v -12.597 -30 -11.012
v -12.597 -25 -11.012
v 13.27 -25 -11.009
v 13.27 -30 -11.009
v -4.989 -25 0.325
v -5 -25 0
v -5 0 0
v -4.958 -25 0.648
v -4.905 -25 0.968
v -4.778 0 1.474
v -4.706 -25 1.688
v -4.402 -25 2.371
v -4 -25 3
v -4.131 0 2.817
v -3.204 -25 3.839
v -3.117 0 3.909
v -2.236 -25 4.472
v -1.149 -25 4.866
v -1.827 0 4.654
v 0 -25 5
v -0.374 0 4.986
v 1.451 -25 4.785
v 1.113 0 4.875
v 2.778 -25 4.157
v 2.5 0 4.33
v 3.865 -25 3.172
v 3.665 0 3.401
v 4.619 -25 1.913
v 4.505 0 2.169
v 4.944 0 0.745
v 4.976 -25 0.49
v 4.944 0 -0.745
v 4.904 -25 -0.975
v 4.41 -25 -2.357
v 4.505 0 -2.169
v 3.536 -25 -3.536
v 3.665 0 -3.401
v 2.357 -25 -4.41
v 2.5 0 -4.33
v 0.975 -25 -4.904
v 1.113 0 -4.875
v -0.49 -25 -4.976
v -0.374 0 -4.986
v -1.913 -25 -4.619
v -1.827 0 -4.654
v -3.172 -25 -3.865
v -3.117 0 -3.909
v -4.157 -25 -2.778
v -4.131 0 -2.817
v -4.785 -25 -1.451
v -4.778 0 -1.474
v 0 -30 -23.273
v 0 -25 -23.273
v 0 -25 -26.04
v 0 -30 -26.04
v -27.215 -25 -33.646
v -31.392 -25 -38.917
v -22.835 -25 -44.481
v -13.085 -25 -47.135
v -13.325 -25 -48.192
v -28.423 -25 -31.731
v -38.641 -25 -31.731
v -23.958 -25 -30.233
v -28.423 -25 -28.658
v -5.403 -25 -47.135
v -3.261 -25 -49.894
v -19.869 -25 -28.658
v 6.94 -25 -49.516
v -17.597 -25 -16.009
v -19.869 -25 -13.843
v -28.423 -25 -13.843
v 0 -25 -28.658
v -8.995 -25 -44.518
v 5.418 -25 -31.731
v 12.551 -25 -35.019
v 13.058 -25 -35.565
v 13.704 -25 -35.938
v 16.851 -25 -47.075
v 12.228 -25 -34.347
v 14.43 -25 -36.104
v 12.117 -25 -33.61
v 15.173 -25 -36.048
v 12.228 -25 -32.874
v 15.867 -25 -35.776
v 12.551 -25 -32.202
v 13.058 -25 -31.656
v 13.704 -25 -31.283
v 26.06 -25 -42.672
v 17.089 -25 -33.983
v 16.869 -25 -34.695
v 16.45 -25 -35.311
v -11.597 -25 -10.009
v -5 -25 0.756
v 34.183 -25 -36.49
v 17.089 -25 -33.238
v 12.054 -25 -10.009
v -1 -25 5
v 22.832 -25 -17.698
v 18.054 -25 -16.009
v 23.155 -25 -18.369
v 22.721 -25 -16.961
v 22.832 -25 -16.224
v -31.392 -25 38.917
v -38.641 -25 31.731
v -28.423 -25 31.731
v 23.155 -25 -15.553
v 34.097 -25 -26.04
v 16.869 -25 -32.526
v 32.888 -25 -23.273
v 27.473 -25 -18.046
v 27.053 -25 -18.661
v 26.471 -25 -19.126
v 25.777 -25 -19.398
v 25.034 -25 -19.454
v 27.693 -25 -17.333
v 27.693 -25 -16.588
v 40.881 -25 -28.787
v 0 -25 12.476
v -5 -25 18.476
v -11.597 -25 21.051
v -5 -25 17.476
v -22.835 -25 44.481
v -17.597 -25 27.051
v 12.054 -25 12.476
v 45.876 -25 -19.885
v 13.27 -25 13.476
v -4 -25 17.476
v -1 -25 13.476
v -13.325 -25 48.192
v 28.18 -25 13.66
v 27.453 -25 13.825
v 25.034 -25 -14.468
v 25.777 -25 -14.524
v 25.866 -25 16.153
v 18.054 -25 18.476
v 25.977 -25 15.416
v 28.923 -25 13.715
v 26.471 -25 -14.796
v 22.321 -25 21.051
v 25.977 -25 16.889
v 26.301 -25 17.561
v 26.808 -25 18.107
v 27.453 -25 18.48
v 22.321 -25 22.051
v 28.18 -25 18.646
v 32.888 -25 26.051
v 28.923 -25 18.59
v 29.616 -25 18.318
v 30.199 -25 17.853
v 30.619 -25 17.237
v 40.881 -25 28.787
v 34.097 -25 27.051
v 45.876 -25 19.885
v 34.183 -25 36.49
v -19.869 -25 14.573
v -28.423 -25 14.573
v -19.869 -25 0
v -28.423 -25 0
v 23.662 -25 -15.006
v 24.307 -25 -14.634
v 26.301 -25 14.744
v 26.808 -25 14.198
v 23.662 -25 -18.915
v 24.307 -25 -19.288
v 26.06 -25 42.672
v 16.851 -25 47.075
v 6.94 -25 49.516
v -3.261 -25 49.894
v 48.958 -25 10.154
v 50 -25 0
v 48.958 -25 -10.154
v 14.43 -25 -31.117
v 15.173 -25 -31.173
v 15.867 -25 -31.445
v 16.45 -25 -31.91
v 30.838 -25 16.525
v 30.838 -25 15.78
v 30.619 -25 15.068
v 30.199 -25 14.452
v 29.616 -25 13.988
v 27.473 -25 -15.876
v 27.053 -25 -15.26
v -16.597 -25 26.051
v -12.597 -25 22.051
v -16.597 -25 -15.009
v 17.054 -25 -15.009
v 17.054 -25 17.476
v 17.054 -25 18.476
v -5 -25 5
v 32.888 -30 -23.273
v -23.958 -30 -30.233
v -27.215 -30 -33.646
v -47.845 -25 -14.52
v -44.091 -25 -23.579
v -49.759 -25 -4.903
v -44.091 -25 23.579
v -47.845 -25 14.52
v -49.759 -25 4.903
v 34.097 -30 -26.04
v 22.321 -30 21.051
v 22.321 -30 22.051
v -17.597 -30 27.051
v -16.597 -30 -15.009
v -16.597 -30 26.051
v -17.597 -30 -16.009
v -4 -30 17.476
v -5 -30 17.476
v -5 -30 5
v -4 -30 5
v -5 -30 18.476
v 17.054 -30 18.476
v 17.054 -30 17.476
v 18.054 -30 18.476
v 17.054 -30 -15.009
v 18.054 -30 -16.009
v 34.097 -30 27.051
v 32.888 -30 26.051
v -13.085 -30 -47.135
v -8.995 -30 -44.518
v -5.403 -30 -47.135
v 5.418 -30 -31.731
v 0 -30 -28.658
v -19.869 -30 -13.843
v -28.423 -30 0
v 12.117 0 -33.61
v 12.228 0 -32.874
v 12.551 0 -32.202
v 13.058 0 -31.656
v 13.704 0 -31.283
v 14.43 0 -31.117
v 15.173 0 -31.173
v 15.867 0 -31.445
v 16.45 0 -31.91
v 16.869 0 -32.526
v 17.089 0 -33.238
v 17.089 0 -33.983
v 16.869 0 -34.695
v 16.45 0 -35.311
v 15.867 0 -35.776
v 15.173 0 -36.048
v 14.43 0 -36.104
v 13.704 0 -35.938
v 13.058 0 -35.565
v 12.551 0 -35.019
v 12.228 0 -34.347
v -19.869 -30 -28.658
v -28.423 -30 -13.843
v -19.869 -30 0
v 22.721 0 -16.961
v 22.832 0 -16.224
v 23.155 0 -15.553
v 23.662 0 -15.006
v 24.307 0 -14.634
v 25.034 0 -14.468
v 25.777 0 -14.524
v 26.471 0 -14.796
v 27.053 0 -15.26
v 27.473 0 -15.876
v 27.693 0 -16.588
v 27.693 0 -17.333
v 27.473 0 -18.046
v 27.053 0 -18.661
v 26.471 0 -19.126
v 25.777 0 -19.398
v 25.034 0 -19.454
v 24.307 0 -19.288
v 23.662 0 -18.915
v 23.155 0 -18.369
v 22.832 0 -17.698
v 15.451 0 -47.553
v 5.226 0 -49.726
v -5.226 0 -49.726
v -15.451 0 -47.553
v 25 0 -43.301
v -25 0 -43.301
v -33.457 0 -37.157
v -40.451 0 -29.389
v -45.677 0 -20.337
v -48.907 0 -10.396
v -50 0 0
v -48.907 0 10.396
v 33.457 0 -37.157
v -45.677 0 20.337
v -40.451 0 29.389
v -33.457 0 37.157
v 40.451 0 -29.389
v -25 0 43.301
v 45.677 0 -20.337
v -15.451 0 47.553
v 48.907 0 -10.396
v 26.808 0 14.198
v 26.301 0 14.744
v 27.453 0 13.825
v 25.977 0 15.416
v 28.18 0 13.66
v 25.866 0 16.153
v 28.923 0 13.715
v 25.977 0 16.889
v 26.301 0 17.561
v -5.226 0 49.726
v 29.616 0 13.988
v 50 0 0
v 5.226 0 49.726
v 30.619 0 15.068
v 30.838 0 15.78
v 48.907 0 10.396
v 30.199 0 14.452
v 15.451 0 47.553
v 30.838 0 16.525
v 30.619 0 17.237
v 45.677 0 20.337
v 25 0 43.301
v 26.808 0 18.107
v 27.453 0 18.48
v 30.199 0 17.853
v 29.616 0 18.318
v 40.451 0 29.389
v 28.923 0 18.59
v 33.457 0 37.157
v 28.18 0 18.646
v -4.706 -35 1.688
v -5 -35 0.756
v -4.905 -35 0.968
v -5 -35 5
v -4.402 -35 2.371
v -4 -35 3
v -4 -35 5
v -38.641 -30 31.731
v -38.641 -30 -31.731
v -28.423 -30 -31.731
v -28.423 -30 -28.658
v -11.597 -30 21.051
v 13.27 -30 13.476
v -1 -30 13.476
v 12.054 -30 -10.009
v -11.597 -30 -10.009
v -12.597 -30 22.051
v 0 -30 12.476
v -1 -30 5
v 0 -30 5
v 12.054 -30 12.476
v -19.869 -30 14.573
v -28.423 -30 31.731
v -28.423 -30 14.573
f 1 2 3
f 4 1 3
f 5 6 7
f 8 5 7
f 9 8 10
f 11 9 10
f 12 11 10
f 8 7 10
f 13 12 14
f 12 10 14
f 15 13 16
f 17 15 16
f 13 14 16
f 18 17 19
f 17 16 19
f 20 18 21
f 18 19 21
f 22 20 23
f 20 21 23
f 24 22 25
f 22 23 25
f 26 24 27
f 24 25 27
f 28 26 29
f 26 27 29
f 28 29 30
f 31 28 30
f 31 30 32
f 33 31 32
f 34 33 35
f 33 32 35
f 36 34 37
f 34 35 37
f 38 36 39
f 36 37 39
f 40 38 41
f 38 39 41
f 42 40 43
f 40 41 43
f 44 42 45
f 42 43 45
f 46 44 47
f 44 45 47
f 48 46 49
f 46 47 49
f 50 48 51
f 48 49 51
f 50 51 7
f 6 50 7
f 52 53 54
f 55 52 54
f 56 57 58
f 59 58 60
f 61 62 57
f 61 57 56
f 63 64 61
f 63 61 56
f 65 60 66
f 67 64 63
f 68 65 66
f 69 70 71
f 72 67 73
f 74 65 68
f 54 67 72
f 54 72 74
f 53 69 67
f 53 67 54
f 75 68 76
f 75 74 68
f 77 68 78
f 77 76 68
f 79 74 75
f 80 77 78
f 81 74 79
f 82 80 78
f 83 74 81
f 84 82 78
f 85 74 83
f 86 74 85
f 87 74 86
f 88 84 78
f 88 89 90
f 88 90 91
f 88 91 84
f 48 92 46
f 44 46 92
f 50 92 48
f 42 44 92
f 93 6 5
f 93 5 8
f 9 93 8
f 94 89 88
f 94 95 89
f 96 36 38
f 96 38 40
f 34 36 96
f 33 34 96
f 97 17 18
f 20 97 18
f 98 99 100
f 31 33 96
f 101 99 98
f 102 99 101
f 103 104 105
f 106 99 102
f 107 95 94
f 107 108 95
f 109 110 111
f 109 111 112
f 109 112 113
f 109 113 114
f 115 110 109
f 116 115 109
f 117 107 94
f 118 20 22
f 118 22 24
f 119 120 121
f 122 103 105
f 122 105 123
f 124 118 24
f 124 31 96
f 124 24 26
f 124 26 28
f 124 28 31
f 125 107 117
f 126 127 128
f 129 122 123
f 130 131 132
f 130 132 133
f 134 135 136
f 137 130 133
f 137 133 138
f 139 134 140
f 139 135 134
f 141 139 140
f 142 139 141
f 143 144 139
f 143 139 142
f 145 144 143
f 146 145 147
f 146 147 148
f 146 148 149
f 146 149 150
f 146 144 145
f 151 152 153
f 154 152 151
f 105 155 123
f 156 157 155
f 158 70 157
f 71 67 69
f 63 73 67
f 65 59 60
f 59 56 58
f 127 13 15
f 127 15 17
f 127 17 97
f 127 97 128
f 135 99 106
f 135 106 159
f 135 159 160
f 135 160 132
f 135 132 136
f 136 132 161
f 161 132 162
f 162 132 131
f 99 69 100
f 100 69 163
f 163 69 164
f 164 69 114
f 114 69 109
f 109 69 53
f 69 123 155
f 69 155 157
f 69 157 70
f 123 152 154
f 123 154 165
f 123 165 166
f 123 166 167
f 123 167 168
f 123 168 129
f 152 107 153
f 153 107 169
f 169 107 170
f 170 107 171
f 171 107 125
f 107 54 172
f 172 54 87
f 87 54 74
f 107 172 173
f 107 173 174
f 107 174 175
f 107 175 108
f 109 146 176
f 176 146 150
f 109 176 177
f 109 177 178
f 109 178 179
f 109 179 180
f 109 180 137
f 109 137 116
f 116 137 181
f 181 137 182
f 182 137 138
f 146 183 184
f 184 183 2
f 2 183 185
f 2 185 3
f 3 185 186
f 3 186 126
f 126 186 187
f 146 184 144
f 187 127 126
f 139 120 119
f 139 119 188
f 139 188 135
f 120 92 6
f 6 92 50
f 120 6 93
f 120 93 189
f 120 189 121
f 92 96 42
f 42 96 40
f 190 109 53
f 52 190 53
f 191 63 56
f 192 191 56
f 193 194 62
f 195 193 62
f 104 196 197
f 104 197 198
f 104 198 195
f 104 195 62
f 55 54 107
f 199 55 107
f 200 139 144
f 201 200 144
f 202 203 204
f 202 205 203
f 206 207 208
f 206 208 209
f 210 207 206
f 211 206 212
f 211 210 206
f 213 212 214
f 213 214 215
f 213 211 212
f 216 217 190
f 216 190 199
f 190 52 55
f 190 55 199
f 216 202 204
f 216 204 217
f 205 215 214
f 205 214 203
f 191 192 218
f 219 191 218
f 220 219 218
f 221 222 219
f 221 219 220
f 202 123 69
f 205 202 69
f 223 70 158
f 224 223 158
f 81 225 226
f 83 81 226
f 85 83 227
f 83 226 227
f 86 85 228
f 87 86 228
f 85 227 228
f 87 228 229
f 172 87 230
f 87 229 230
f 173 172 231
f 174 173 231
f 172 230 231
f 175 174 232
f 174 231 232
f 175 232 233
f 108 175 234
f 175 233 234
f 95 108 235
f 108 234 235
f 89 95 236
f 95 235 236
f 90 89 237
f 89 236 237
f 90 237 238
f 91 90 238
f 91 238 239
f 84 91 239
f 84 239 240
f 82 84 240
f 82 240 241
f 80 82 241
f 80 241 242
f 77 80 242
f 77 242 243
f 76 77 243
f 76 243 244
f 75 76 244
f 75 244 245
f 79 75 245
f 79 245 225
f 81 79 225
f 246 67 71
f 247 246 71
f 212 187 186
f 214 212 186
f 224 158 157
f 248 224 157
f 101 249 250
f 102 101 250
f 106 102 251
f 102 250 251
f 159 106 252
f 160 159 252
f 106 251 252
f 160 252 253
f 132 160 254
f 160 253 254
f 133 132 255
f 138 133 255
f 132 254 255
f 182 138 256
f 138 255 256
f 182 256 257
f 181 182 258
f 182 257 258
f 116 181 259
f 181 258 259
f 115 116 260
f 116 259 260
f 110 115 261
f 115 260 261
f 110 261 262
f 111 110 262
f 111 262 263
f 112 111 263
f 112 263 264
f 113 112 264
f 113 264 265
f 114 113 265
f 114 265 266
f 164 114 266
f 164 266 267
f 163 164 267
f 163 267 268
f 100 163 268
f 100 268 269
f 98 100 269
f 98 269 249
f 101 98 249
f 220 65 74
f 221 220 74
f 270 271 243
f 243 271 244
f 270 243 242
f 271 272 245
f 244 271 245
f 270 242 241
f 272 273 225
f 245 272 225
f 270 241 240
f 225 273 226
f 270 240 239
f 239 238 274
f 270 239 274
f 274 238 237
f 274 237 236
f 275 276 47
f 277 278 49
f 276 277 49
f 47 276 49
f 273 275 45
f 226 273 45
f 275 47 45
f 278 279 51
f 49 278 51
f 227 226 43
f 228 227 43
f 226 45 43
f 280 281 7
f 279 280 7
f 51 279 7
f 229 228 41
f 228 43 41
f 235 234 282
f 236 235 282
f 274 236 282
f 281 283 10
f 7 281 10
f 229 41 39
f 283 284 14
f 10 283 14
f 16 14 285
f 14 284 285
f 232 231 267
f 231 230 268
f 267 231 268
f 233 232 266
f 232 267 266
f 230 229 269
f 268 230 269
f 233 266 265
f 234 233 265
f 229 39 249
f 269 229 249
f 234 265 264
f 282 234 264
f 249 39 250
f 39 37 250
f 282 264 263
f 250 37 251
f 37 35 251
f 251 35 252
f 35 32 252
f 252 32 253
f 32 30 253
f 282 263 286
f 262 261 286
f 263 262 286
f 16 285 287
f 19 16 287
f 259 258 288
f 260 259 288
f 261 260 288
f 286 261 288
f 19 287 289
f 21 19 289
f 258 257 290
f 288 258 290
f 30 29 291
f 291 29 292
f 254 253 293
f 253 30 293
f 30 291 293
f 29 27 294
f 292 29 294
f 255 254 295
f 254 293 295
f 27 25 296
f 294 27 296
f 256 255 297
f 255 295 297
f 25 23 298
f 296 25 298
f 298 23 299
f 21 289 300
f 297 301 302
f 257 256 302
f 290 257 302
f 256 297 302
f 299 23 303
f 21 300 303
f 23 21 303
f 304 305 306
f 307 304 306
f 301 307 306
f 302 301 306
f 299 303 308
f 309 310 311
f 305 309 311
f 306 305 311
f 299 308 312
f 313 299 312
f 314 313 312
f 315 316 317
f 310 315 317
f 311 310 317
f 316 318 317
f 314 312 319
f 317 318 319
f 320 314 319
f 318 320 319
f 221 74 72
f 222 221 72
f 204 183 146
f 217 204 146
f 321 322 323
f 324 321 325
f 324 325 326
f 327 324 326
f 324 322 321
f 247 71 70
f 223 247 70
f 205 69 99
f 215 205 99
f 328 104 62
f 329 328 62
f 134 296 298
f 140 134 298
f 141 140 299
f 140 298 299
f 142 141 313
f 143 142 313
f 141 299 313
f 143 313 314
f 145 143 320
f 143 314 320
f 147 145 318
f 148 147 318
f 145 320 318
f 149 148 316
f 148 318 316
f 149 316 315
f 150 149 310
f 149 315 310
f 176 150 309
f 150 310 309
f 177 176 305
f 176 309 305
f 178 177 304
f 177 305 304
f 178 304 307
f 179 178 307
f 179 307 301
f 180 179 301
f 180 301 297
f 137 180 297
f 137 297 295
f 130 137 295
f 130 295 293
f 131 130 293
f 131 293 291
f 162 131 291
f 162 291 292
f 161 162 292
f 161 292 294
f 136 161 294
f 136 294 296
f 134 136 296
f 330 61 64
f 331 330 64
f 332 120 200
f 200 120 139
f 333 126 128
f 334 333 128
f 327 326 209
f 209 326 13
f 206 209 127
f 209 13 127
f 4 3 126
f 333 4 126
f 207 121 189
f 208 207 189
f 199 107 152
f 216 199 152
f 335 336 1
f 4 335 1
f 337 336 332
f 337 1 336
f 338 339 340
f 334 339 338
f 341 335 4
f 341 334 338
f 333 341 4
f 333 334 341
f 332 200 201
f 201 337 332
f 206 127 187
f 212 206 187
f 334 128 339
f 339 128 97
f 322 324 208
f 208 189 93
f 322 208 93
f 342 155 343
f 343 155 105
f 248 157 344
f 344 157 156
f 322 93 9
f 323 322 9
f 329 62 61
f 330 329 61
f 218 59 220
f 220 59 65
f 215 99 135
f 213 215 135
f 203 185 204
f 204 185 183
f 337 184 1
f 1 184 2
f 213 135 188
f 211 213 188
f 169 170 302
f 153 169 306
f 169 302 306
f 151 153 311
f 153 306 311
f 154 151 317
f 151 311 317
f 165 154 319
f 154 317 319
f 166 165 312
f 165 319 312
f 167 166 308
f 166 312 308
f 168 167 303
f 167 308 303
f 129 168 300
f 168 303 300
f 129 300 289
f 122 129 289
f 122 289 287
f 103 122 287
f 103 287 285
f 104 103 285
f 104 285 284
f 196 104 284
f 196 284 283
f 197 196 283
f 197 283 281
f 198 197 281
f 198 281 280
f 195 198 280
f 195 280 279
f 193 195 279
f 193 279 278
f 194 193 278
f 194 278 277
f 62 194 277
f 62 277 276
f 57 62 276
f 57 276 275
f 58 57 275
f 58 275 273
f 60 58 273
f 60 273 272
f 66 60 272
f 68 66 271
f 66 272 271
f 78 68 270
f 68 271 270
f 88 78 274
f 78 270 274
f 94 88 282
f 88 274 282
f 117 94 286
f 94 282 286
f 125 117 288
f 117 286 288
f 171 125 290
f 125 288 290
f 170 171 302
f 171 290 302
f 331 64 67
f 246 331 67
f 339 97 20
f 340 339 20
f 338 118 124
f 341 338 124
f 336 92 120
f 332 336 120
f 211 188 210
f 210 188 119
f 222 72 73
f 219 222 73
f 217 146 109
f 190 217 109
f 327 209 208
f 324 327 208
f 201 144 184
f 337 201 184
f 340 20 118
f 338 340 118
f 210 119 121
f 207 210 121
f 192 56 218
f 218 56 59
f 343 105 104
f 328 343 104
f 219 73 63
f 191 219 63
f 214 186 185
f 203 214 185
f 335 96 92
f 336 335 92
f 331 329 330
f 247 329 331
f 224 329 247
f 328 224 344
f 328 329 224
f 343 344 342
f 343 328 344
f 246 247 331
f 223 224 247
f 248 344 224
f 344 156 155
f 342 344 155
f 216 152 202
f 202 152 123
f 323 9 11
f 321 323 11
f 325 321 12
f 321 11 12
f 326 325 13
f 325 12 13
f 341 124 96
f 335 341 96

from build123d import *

# Parameters (mm, degrees)
F0_R      = 50
F1_DEPTH  = 25
F3_D      = 10
F5_DEPTH  = 5
F7_DEPTH  = 10
F9_DEPTH  = 5
F11_DEPTH = 5
F13_D     = 5
F15_DEPTH = 5
F17_DEPTH = 5
F19_DEPTH = 5
F21_D     = 5


with BuildPart() as f1:
    # F0 (on Front) → F1 (new body)
    with BuildSketch(Plane.XZ):
        Circle(F0_R)
    extrude(amount=F1_DEPTH)

    # F3 (through all)
    with Locations(Plane.XZ.offset(25)):
        with Locations((0, 0)):
            Hole(F3_D / 2)

    # F4 (on face) → F5 (join)
    with BuildSketch(Plane.XZ.offset(25)):
        Polygon((-1, 5), (0, 5), (0, 12.4759720638), (12.0539031955, 12.4759720638), (12.0539031955, 0), (12.0539031955, -10.0090857595), (0, -10.0090857595), (-11.5974724069, -10.0090857595), (-11.5974724069, 0), (-11.5974724069, 12.4759720638), (-11.5974724069, 21.0507828742), (22.3206661865, 21.0507828742), (22.3206661865, 22.0507828742), (-11.5974724069, 22.0507828742), (-12.5974724069, 22.0507828742), (-12.5974724069, 5.5559086613), (-12.5974724069, -11.0117533952), (13.2704021633, -11.0090857595), (13.2704021633, -10.0090857595), (13.2704021633, 12.4759720638), (13.2704021633, 13.4759720638), (0, 13.4759720638), (-1, 13.4759720638), (-1, 12.4759720638), align=None)
        Polygon((-16.5974722952, 12.4759720638), (-16.5974722952, 26.0507827625), (22.3206661865, 26.0507827625), (22.3206661865, 27.0507827625), (-16.5974722952, 27.0507827625), (-17.5974722952, 27.0507827625), (-17.5974722952, 26.1644367129), (-17.5974722952, -14.8946940899), (-17.5974722952, -15.0090856478), (-17.5974722952, -16.0090856478), (18.0539030838, -16.0090856478), (18.0539030838, -15.0090856478), (18.0539030838, 18.475971811), (17.0539030838, 18.475971811), (-4.9999998818, 18.4759719521), (-4.9999998882, 17.4759719521), (-4.9999998882, 5), (-3.9999998882, 5), (-3.9999998882, 17.4759719521), (17.0539030838, 17.4759719521), (17.0539030838, 0), (17.0539030838, -15.0090856478), (-0.0038306937, -15.0090856478), (-16.5974722952, -15.0090856478), (-16.5974722952, 0), align=None)
    extrude(amount=F5_DEPTH)

    # F6 (on face) → F7 (join)
    with BuildSketch(Plane.XZ.offset(25)):
        with BuildLine():
            Line((-3.9999998882, 5), (-4.9999998882, 5))
            Line((-4.9999998882, 5), (-4.9999999831, 0.7558615648))
            Line((-4.9999999831, 0.7558615648), (-4.9053492841, 0.9682708303))
            ThreePointArc((-4.9053492841, 0.9682708303), (-4.5670879099, 2.0351186755), (-3.9999998882, 3.000000149))
            Line((-3.9999998882, 3.000000149), (-3.9999998882, 5))
        make_face()
    extrude(amount=F7_DEPTH)

    # F8 (on face) → F9 (join)
    with BuildSketch(Plane.XZ.offset(25)):
        Polygon((25.6022717804, 27.0507827625), (22.3206661865, 27.0507827625), (22.3206661865, 26.0507827625), (25.6022717804, 26.0507827625), (27.1489042789, 26.0507827625), (28.8951024413, 26.0507827625), (32.8879207373, 26.0507827625), (32.8879207373, 18.475971811), (32.8879207373, 9.354759939), (32.8879207373, 5.5606500246), (32.8879207373, 0), (32.8879207373, -5.7792388834), (32.8879207373, -17.5537280738), (32.8879207373, -21.467147395), (32.8879207373, -23.2733413577), (34.0968593955, -23.2733413577), (34.0968593955, -16.0090856478), (34.0968593955, 0), (34.0968593955, 6.9746486843), (34.0968593955, 11.9728827849), (34.0968593955, 18.475971811), (34.0968593955, 27.0507827625), (32.8879207373, 27.0507827625), (28.4710265696, 27.0507827625), align=None)
    extrude(amount=F9_DEPTH)

    # F10 (on face) → F11 (join)
    with BuildSketch(Plane.XZ.offset(25)):
        Polygon((34.0968593955, -23.2733413577), (32.8879207373, -23.2733413577), (0, -23.2733413577), (0, -26.040263474), (34.0968593955, -26.040263474), align=None)
    extrude(amount=F11_DEPTH)

    # F13 (through all)
    with Locations(Plane.XZ.offset(25)):
        with Locations((25.2206400037, -16.9608648866), (28.3664222807, 16.152607277)):
            Hole(F13_D / 2)

    # F14 (on face) → F15 (join)
    with BuildSketch(Plane.XZ.offset(25)):
        Polygon((-28.4231826663, 31.7307532181), (-38.6414194901, 31.7307532181), (-38.6414194901, -31.7307532181), (-28.4231826663, -31.7307532181), (-28.4231826663, -31.0340896249), align=None)
    extrude(amount=F15_DEPTH)

    # F16 (on face) → F17 (join)
    with BuildSketch(Plane.XZ.offset(25)):
        Polygon((-19.8692139238, -28.657739982), (-28.4231826663, -13.8425510377), (-28.4231826663, -28.657739982), align=None)
        Polygon((-19.8692139238, -13.8425510377), (-28.4231826663, 0), (-28.4231826663, -13.8425510377), align=None)
        Polygon((-19.8692139238, 0), (-28.4231826663, 14.5734706894), (-28.4231826663, 0), align=None)
        Polygon((-19.8692139238, 14.5734706894), (-28.4231826663, 31.7307532181), (-28.4231826663, 14.5734706894), align=None)
    extrude(amount=F17_DEPTH)

    # F18 (on face) → F19 (join)
    with BuildSketch(Plane.XZ.offset(25)):
        Polygon((-23.9576643267, -30.233348331), (-27.21523121, -33.645581454), (-13.0854109302, -47.1349395812), (-8.995237881, -44.5175730967), align=None)
        Polygon((-8.995237881, -44.5175730967), (-13.0854109302, -47.1349395812), (-5.403298419, -47.1349395812), (5.4181421023, -31.7307532181), (0, -28.657739982), align=None)
    extrude(amount=F19_DEPTH)

    # F21 (through all)
    with Locations(Plane.XZ.offset(25)):
        with Locations((14.6169317886, -33.61049667)):
            Hole(F21_D / 2)


solid = f1.part
